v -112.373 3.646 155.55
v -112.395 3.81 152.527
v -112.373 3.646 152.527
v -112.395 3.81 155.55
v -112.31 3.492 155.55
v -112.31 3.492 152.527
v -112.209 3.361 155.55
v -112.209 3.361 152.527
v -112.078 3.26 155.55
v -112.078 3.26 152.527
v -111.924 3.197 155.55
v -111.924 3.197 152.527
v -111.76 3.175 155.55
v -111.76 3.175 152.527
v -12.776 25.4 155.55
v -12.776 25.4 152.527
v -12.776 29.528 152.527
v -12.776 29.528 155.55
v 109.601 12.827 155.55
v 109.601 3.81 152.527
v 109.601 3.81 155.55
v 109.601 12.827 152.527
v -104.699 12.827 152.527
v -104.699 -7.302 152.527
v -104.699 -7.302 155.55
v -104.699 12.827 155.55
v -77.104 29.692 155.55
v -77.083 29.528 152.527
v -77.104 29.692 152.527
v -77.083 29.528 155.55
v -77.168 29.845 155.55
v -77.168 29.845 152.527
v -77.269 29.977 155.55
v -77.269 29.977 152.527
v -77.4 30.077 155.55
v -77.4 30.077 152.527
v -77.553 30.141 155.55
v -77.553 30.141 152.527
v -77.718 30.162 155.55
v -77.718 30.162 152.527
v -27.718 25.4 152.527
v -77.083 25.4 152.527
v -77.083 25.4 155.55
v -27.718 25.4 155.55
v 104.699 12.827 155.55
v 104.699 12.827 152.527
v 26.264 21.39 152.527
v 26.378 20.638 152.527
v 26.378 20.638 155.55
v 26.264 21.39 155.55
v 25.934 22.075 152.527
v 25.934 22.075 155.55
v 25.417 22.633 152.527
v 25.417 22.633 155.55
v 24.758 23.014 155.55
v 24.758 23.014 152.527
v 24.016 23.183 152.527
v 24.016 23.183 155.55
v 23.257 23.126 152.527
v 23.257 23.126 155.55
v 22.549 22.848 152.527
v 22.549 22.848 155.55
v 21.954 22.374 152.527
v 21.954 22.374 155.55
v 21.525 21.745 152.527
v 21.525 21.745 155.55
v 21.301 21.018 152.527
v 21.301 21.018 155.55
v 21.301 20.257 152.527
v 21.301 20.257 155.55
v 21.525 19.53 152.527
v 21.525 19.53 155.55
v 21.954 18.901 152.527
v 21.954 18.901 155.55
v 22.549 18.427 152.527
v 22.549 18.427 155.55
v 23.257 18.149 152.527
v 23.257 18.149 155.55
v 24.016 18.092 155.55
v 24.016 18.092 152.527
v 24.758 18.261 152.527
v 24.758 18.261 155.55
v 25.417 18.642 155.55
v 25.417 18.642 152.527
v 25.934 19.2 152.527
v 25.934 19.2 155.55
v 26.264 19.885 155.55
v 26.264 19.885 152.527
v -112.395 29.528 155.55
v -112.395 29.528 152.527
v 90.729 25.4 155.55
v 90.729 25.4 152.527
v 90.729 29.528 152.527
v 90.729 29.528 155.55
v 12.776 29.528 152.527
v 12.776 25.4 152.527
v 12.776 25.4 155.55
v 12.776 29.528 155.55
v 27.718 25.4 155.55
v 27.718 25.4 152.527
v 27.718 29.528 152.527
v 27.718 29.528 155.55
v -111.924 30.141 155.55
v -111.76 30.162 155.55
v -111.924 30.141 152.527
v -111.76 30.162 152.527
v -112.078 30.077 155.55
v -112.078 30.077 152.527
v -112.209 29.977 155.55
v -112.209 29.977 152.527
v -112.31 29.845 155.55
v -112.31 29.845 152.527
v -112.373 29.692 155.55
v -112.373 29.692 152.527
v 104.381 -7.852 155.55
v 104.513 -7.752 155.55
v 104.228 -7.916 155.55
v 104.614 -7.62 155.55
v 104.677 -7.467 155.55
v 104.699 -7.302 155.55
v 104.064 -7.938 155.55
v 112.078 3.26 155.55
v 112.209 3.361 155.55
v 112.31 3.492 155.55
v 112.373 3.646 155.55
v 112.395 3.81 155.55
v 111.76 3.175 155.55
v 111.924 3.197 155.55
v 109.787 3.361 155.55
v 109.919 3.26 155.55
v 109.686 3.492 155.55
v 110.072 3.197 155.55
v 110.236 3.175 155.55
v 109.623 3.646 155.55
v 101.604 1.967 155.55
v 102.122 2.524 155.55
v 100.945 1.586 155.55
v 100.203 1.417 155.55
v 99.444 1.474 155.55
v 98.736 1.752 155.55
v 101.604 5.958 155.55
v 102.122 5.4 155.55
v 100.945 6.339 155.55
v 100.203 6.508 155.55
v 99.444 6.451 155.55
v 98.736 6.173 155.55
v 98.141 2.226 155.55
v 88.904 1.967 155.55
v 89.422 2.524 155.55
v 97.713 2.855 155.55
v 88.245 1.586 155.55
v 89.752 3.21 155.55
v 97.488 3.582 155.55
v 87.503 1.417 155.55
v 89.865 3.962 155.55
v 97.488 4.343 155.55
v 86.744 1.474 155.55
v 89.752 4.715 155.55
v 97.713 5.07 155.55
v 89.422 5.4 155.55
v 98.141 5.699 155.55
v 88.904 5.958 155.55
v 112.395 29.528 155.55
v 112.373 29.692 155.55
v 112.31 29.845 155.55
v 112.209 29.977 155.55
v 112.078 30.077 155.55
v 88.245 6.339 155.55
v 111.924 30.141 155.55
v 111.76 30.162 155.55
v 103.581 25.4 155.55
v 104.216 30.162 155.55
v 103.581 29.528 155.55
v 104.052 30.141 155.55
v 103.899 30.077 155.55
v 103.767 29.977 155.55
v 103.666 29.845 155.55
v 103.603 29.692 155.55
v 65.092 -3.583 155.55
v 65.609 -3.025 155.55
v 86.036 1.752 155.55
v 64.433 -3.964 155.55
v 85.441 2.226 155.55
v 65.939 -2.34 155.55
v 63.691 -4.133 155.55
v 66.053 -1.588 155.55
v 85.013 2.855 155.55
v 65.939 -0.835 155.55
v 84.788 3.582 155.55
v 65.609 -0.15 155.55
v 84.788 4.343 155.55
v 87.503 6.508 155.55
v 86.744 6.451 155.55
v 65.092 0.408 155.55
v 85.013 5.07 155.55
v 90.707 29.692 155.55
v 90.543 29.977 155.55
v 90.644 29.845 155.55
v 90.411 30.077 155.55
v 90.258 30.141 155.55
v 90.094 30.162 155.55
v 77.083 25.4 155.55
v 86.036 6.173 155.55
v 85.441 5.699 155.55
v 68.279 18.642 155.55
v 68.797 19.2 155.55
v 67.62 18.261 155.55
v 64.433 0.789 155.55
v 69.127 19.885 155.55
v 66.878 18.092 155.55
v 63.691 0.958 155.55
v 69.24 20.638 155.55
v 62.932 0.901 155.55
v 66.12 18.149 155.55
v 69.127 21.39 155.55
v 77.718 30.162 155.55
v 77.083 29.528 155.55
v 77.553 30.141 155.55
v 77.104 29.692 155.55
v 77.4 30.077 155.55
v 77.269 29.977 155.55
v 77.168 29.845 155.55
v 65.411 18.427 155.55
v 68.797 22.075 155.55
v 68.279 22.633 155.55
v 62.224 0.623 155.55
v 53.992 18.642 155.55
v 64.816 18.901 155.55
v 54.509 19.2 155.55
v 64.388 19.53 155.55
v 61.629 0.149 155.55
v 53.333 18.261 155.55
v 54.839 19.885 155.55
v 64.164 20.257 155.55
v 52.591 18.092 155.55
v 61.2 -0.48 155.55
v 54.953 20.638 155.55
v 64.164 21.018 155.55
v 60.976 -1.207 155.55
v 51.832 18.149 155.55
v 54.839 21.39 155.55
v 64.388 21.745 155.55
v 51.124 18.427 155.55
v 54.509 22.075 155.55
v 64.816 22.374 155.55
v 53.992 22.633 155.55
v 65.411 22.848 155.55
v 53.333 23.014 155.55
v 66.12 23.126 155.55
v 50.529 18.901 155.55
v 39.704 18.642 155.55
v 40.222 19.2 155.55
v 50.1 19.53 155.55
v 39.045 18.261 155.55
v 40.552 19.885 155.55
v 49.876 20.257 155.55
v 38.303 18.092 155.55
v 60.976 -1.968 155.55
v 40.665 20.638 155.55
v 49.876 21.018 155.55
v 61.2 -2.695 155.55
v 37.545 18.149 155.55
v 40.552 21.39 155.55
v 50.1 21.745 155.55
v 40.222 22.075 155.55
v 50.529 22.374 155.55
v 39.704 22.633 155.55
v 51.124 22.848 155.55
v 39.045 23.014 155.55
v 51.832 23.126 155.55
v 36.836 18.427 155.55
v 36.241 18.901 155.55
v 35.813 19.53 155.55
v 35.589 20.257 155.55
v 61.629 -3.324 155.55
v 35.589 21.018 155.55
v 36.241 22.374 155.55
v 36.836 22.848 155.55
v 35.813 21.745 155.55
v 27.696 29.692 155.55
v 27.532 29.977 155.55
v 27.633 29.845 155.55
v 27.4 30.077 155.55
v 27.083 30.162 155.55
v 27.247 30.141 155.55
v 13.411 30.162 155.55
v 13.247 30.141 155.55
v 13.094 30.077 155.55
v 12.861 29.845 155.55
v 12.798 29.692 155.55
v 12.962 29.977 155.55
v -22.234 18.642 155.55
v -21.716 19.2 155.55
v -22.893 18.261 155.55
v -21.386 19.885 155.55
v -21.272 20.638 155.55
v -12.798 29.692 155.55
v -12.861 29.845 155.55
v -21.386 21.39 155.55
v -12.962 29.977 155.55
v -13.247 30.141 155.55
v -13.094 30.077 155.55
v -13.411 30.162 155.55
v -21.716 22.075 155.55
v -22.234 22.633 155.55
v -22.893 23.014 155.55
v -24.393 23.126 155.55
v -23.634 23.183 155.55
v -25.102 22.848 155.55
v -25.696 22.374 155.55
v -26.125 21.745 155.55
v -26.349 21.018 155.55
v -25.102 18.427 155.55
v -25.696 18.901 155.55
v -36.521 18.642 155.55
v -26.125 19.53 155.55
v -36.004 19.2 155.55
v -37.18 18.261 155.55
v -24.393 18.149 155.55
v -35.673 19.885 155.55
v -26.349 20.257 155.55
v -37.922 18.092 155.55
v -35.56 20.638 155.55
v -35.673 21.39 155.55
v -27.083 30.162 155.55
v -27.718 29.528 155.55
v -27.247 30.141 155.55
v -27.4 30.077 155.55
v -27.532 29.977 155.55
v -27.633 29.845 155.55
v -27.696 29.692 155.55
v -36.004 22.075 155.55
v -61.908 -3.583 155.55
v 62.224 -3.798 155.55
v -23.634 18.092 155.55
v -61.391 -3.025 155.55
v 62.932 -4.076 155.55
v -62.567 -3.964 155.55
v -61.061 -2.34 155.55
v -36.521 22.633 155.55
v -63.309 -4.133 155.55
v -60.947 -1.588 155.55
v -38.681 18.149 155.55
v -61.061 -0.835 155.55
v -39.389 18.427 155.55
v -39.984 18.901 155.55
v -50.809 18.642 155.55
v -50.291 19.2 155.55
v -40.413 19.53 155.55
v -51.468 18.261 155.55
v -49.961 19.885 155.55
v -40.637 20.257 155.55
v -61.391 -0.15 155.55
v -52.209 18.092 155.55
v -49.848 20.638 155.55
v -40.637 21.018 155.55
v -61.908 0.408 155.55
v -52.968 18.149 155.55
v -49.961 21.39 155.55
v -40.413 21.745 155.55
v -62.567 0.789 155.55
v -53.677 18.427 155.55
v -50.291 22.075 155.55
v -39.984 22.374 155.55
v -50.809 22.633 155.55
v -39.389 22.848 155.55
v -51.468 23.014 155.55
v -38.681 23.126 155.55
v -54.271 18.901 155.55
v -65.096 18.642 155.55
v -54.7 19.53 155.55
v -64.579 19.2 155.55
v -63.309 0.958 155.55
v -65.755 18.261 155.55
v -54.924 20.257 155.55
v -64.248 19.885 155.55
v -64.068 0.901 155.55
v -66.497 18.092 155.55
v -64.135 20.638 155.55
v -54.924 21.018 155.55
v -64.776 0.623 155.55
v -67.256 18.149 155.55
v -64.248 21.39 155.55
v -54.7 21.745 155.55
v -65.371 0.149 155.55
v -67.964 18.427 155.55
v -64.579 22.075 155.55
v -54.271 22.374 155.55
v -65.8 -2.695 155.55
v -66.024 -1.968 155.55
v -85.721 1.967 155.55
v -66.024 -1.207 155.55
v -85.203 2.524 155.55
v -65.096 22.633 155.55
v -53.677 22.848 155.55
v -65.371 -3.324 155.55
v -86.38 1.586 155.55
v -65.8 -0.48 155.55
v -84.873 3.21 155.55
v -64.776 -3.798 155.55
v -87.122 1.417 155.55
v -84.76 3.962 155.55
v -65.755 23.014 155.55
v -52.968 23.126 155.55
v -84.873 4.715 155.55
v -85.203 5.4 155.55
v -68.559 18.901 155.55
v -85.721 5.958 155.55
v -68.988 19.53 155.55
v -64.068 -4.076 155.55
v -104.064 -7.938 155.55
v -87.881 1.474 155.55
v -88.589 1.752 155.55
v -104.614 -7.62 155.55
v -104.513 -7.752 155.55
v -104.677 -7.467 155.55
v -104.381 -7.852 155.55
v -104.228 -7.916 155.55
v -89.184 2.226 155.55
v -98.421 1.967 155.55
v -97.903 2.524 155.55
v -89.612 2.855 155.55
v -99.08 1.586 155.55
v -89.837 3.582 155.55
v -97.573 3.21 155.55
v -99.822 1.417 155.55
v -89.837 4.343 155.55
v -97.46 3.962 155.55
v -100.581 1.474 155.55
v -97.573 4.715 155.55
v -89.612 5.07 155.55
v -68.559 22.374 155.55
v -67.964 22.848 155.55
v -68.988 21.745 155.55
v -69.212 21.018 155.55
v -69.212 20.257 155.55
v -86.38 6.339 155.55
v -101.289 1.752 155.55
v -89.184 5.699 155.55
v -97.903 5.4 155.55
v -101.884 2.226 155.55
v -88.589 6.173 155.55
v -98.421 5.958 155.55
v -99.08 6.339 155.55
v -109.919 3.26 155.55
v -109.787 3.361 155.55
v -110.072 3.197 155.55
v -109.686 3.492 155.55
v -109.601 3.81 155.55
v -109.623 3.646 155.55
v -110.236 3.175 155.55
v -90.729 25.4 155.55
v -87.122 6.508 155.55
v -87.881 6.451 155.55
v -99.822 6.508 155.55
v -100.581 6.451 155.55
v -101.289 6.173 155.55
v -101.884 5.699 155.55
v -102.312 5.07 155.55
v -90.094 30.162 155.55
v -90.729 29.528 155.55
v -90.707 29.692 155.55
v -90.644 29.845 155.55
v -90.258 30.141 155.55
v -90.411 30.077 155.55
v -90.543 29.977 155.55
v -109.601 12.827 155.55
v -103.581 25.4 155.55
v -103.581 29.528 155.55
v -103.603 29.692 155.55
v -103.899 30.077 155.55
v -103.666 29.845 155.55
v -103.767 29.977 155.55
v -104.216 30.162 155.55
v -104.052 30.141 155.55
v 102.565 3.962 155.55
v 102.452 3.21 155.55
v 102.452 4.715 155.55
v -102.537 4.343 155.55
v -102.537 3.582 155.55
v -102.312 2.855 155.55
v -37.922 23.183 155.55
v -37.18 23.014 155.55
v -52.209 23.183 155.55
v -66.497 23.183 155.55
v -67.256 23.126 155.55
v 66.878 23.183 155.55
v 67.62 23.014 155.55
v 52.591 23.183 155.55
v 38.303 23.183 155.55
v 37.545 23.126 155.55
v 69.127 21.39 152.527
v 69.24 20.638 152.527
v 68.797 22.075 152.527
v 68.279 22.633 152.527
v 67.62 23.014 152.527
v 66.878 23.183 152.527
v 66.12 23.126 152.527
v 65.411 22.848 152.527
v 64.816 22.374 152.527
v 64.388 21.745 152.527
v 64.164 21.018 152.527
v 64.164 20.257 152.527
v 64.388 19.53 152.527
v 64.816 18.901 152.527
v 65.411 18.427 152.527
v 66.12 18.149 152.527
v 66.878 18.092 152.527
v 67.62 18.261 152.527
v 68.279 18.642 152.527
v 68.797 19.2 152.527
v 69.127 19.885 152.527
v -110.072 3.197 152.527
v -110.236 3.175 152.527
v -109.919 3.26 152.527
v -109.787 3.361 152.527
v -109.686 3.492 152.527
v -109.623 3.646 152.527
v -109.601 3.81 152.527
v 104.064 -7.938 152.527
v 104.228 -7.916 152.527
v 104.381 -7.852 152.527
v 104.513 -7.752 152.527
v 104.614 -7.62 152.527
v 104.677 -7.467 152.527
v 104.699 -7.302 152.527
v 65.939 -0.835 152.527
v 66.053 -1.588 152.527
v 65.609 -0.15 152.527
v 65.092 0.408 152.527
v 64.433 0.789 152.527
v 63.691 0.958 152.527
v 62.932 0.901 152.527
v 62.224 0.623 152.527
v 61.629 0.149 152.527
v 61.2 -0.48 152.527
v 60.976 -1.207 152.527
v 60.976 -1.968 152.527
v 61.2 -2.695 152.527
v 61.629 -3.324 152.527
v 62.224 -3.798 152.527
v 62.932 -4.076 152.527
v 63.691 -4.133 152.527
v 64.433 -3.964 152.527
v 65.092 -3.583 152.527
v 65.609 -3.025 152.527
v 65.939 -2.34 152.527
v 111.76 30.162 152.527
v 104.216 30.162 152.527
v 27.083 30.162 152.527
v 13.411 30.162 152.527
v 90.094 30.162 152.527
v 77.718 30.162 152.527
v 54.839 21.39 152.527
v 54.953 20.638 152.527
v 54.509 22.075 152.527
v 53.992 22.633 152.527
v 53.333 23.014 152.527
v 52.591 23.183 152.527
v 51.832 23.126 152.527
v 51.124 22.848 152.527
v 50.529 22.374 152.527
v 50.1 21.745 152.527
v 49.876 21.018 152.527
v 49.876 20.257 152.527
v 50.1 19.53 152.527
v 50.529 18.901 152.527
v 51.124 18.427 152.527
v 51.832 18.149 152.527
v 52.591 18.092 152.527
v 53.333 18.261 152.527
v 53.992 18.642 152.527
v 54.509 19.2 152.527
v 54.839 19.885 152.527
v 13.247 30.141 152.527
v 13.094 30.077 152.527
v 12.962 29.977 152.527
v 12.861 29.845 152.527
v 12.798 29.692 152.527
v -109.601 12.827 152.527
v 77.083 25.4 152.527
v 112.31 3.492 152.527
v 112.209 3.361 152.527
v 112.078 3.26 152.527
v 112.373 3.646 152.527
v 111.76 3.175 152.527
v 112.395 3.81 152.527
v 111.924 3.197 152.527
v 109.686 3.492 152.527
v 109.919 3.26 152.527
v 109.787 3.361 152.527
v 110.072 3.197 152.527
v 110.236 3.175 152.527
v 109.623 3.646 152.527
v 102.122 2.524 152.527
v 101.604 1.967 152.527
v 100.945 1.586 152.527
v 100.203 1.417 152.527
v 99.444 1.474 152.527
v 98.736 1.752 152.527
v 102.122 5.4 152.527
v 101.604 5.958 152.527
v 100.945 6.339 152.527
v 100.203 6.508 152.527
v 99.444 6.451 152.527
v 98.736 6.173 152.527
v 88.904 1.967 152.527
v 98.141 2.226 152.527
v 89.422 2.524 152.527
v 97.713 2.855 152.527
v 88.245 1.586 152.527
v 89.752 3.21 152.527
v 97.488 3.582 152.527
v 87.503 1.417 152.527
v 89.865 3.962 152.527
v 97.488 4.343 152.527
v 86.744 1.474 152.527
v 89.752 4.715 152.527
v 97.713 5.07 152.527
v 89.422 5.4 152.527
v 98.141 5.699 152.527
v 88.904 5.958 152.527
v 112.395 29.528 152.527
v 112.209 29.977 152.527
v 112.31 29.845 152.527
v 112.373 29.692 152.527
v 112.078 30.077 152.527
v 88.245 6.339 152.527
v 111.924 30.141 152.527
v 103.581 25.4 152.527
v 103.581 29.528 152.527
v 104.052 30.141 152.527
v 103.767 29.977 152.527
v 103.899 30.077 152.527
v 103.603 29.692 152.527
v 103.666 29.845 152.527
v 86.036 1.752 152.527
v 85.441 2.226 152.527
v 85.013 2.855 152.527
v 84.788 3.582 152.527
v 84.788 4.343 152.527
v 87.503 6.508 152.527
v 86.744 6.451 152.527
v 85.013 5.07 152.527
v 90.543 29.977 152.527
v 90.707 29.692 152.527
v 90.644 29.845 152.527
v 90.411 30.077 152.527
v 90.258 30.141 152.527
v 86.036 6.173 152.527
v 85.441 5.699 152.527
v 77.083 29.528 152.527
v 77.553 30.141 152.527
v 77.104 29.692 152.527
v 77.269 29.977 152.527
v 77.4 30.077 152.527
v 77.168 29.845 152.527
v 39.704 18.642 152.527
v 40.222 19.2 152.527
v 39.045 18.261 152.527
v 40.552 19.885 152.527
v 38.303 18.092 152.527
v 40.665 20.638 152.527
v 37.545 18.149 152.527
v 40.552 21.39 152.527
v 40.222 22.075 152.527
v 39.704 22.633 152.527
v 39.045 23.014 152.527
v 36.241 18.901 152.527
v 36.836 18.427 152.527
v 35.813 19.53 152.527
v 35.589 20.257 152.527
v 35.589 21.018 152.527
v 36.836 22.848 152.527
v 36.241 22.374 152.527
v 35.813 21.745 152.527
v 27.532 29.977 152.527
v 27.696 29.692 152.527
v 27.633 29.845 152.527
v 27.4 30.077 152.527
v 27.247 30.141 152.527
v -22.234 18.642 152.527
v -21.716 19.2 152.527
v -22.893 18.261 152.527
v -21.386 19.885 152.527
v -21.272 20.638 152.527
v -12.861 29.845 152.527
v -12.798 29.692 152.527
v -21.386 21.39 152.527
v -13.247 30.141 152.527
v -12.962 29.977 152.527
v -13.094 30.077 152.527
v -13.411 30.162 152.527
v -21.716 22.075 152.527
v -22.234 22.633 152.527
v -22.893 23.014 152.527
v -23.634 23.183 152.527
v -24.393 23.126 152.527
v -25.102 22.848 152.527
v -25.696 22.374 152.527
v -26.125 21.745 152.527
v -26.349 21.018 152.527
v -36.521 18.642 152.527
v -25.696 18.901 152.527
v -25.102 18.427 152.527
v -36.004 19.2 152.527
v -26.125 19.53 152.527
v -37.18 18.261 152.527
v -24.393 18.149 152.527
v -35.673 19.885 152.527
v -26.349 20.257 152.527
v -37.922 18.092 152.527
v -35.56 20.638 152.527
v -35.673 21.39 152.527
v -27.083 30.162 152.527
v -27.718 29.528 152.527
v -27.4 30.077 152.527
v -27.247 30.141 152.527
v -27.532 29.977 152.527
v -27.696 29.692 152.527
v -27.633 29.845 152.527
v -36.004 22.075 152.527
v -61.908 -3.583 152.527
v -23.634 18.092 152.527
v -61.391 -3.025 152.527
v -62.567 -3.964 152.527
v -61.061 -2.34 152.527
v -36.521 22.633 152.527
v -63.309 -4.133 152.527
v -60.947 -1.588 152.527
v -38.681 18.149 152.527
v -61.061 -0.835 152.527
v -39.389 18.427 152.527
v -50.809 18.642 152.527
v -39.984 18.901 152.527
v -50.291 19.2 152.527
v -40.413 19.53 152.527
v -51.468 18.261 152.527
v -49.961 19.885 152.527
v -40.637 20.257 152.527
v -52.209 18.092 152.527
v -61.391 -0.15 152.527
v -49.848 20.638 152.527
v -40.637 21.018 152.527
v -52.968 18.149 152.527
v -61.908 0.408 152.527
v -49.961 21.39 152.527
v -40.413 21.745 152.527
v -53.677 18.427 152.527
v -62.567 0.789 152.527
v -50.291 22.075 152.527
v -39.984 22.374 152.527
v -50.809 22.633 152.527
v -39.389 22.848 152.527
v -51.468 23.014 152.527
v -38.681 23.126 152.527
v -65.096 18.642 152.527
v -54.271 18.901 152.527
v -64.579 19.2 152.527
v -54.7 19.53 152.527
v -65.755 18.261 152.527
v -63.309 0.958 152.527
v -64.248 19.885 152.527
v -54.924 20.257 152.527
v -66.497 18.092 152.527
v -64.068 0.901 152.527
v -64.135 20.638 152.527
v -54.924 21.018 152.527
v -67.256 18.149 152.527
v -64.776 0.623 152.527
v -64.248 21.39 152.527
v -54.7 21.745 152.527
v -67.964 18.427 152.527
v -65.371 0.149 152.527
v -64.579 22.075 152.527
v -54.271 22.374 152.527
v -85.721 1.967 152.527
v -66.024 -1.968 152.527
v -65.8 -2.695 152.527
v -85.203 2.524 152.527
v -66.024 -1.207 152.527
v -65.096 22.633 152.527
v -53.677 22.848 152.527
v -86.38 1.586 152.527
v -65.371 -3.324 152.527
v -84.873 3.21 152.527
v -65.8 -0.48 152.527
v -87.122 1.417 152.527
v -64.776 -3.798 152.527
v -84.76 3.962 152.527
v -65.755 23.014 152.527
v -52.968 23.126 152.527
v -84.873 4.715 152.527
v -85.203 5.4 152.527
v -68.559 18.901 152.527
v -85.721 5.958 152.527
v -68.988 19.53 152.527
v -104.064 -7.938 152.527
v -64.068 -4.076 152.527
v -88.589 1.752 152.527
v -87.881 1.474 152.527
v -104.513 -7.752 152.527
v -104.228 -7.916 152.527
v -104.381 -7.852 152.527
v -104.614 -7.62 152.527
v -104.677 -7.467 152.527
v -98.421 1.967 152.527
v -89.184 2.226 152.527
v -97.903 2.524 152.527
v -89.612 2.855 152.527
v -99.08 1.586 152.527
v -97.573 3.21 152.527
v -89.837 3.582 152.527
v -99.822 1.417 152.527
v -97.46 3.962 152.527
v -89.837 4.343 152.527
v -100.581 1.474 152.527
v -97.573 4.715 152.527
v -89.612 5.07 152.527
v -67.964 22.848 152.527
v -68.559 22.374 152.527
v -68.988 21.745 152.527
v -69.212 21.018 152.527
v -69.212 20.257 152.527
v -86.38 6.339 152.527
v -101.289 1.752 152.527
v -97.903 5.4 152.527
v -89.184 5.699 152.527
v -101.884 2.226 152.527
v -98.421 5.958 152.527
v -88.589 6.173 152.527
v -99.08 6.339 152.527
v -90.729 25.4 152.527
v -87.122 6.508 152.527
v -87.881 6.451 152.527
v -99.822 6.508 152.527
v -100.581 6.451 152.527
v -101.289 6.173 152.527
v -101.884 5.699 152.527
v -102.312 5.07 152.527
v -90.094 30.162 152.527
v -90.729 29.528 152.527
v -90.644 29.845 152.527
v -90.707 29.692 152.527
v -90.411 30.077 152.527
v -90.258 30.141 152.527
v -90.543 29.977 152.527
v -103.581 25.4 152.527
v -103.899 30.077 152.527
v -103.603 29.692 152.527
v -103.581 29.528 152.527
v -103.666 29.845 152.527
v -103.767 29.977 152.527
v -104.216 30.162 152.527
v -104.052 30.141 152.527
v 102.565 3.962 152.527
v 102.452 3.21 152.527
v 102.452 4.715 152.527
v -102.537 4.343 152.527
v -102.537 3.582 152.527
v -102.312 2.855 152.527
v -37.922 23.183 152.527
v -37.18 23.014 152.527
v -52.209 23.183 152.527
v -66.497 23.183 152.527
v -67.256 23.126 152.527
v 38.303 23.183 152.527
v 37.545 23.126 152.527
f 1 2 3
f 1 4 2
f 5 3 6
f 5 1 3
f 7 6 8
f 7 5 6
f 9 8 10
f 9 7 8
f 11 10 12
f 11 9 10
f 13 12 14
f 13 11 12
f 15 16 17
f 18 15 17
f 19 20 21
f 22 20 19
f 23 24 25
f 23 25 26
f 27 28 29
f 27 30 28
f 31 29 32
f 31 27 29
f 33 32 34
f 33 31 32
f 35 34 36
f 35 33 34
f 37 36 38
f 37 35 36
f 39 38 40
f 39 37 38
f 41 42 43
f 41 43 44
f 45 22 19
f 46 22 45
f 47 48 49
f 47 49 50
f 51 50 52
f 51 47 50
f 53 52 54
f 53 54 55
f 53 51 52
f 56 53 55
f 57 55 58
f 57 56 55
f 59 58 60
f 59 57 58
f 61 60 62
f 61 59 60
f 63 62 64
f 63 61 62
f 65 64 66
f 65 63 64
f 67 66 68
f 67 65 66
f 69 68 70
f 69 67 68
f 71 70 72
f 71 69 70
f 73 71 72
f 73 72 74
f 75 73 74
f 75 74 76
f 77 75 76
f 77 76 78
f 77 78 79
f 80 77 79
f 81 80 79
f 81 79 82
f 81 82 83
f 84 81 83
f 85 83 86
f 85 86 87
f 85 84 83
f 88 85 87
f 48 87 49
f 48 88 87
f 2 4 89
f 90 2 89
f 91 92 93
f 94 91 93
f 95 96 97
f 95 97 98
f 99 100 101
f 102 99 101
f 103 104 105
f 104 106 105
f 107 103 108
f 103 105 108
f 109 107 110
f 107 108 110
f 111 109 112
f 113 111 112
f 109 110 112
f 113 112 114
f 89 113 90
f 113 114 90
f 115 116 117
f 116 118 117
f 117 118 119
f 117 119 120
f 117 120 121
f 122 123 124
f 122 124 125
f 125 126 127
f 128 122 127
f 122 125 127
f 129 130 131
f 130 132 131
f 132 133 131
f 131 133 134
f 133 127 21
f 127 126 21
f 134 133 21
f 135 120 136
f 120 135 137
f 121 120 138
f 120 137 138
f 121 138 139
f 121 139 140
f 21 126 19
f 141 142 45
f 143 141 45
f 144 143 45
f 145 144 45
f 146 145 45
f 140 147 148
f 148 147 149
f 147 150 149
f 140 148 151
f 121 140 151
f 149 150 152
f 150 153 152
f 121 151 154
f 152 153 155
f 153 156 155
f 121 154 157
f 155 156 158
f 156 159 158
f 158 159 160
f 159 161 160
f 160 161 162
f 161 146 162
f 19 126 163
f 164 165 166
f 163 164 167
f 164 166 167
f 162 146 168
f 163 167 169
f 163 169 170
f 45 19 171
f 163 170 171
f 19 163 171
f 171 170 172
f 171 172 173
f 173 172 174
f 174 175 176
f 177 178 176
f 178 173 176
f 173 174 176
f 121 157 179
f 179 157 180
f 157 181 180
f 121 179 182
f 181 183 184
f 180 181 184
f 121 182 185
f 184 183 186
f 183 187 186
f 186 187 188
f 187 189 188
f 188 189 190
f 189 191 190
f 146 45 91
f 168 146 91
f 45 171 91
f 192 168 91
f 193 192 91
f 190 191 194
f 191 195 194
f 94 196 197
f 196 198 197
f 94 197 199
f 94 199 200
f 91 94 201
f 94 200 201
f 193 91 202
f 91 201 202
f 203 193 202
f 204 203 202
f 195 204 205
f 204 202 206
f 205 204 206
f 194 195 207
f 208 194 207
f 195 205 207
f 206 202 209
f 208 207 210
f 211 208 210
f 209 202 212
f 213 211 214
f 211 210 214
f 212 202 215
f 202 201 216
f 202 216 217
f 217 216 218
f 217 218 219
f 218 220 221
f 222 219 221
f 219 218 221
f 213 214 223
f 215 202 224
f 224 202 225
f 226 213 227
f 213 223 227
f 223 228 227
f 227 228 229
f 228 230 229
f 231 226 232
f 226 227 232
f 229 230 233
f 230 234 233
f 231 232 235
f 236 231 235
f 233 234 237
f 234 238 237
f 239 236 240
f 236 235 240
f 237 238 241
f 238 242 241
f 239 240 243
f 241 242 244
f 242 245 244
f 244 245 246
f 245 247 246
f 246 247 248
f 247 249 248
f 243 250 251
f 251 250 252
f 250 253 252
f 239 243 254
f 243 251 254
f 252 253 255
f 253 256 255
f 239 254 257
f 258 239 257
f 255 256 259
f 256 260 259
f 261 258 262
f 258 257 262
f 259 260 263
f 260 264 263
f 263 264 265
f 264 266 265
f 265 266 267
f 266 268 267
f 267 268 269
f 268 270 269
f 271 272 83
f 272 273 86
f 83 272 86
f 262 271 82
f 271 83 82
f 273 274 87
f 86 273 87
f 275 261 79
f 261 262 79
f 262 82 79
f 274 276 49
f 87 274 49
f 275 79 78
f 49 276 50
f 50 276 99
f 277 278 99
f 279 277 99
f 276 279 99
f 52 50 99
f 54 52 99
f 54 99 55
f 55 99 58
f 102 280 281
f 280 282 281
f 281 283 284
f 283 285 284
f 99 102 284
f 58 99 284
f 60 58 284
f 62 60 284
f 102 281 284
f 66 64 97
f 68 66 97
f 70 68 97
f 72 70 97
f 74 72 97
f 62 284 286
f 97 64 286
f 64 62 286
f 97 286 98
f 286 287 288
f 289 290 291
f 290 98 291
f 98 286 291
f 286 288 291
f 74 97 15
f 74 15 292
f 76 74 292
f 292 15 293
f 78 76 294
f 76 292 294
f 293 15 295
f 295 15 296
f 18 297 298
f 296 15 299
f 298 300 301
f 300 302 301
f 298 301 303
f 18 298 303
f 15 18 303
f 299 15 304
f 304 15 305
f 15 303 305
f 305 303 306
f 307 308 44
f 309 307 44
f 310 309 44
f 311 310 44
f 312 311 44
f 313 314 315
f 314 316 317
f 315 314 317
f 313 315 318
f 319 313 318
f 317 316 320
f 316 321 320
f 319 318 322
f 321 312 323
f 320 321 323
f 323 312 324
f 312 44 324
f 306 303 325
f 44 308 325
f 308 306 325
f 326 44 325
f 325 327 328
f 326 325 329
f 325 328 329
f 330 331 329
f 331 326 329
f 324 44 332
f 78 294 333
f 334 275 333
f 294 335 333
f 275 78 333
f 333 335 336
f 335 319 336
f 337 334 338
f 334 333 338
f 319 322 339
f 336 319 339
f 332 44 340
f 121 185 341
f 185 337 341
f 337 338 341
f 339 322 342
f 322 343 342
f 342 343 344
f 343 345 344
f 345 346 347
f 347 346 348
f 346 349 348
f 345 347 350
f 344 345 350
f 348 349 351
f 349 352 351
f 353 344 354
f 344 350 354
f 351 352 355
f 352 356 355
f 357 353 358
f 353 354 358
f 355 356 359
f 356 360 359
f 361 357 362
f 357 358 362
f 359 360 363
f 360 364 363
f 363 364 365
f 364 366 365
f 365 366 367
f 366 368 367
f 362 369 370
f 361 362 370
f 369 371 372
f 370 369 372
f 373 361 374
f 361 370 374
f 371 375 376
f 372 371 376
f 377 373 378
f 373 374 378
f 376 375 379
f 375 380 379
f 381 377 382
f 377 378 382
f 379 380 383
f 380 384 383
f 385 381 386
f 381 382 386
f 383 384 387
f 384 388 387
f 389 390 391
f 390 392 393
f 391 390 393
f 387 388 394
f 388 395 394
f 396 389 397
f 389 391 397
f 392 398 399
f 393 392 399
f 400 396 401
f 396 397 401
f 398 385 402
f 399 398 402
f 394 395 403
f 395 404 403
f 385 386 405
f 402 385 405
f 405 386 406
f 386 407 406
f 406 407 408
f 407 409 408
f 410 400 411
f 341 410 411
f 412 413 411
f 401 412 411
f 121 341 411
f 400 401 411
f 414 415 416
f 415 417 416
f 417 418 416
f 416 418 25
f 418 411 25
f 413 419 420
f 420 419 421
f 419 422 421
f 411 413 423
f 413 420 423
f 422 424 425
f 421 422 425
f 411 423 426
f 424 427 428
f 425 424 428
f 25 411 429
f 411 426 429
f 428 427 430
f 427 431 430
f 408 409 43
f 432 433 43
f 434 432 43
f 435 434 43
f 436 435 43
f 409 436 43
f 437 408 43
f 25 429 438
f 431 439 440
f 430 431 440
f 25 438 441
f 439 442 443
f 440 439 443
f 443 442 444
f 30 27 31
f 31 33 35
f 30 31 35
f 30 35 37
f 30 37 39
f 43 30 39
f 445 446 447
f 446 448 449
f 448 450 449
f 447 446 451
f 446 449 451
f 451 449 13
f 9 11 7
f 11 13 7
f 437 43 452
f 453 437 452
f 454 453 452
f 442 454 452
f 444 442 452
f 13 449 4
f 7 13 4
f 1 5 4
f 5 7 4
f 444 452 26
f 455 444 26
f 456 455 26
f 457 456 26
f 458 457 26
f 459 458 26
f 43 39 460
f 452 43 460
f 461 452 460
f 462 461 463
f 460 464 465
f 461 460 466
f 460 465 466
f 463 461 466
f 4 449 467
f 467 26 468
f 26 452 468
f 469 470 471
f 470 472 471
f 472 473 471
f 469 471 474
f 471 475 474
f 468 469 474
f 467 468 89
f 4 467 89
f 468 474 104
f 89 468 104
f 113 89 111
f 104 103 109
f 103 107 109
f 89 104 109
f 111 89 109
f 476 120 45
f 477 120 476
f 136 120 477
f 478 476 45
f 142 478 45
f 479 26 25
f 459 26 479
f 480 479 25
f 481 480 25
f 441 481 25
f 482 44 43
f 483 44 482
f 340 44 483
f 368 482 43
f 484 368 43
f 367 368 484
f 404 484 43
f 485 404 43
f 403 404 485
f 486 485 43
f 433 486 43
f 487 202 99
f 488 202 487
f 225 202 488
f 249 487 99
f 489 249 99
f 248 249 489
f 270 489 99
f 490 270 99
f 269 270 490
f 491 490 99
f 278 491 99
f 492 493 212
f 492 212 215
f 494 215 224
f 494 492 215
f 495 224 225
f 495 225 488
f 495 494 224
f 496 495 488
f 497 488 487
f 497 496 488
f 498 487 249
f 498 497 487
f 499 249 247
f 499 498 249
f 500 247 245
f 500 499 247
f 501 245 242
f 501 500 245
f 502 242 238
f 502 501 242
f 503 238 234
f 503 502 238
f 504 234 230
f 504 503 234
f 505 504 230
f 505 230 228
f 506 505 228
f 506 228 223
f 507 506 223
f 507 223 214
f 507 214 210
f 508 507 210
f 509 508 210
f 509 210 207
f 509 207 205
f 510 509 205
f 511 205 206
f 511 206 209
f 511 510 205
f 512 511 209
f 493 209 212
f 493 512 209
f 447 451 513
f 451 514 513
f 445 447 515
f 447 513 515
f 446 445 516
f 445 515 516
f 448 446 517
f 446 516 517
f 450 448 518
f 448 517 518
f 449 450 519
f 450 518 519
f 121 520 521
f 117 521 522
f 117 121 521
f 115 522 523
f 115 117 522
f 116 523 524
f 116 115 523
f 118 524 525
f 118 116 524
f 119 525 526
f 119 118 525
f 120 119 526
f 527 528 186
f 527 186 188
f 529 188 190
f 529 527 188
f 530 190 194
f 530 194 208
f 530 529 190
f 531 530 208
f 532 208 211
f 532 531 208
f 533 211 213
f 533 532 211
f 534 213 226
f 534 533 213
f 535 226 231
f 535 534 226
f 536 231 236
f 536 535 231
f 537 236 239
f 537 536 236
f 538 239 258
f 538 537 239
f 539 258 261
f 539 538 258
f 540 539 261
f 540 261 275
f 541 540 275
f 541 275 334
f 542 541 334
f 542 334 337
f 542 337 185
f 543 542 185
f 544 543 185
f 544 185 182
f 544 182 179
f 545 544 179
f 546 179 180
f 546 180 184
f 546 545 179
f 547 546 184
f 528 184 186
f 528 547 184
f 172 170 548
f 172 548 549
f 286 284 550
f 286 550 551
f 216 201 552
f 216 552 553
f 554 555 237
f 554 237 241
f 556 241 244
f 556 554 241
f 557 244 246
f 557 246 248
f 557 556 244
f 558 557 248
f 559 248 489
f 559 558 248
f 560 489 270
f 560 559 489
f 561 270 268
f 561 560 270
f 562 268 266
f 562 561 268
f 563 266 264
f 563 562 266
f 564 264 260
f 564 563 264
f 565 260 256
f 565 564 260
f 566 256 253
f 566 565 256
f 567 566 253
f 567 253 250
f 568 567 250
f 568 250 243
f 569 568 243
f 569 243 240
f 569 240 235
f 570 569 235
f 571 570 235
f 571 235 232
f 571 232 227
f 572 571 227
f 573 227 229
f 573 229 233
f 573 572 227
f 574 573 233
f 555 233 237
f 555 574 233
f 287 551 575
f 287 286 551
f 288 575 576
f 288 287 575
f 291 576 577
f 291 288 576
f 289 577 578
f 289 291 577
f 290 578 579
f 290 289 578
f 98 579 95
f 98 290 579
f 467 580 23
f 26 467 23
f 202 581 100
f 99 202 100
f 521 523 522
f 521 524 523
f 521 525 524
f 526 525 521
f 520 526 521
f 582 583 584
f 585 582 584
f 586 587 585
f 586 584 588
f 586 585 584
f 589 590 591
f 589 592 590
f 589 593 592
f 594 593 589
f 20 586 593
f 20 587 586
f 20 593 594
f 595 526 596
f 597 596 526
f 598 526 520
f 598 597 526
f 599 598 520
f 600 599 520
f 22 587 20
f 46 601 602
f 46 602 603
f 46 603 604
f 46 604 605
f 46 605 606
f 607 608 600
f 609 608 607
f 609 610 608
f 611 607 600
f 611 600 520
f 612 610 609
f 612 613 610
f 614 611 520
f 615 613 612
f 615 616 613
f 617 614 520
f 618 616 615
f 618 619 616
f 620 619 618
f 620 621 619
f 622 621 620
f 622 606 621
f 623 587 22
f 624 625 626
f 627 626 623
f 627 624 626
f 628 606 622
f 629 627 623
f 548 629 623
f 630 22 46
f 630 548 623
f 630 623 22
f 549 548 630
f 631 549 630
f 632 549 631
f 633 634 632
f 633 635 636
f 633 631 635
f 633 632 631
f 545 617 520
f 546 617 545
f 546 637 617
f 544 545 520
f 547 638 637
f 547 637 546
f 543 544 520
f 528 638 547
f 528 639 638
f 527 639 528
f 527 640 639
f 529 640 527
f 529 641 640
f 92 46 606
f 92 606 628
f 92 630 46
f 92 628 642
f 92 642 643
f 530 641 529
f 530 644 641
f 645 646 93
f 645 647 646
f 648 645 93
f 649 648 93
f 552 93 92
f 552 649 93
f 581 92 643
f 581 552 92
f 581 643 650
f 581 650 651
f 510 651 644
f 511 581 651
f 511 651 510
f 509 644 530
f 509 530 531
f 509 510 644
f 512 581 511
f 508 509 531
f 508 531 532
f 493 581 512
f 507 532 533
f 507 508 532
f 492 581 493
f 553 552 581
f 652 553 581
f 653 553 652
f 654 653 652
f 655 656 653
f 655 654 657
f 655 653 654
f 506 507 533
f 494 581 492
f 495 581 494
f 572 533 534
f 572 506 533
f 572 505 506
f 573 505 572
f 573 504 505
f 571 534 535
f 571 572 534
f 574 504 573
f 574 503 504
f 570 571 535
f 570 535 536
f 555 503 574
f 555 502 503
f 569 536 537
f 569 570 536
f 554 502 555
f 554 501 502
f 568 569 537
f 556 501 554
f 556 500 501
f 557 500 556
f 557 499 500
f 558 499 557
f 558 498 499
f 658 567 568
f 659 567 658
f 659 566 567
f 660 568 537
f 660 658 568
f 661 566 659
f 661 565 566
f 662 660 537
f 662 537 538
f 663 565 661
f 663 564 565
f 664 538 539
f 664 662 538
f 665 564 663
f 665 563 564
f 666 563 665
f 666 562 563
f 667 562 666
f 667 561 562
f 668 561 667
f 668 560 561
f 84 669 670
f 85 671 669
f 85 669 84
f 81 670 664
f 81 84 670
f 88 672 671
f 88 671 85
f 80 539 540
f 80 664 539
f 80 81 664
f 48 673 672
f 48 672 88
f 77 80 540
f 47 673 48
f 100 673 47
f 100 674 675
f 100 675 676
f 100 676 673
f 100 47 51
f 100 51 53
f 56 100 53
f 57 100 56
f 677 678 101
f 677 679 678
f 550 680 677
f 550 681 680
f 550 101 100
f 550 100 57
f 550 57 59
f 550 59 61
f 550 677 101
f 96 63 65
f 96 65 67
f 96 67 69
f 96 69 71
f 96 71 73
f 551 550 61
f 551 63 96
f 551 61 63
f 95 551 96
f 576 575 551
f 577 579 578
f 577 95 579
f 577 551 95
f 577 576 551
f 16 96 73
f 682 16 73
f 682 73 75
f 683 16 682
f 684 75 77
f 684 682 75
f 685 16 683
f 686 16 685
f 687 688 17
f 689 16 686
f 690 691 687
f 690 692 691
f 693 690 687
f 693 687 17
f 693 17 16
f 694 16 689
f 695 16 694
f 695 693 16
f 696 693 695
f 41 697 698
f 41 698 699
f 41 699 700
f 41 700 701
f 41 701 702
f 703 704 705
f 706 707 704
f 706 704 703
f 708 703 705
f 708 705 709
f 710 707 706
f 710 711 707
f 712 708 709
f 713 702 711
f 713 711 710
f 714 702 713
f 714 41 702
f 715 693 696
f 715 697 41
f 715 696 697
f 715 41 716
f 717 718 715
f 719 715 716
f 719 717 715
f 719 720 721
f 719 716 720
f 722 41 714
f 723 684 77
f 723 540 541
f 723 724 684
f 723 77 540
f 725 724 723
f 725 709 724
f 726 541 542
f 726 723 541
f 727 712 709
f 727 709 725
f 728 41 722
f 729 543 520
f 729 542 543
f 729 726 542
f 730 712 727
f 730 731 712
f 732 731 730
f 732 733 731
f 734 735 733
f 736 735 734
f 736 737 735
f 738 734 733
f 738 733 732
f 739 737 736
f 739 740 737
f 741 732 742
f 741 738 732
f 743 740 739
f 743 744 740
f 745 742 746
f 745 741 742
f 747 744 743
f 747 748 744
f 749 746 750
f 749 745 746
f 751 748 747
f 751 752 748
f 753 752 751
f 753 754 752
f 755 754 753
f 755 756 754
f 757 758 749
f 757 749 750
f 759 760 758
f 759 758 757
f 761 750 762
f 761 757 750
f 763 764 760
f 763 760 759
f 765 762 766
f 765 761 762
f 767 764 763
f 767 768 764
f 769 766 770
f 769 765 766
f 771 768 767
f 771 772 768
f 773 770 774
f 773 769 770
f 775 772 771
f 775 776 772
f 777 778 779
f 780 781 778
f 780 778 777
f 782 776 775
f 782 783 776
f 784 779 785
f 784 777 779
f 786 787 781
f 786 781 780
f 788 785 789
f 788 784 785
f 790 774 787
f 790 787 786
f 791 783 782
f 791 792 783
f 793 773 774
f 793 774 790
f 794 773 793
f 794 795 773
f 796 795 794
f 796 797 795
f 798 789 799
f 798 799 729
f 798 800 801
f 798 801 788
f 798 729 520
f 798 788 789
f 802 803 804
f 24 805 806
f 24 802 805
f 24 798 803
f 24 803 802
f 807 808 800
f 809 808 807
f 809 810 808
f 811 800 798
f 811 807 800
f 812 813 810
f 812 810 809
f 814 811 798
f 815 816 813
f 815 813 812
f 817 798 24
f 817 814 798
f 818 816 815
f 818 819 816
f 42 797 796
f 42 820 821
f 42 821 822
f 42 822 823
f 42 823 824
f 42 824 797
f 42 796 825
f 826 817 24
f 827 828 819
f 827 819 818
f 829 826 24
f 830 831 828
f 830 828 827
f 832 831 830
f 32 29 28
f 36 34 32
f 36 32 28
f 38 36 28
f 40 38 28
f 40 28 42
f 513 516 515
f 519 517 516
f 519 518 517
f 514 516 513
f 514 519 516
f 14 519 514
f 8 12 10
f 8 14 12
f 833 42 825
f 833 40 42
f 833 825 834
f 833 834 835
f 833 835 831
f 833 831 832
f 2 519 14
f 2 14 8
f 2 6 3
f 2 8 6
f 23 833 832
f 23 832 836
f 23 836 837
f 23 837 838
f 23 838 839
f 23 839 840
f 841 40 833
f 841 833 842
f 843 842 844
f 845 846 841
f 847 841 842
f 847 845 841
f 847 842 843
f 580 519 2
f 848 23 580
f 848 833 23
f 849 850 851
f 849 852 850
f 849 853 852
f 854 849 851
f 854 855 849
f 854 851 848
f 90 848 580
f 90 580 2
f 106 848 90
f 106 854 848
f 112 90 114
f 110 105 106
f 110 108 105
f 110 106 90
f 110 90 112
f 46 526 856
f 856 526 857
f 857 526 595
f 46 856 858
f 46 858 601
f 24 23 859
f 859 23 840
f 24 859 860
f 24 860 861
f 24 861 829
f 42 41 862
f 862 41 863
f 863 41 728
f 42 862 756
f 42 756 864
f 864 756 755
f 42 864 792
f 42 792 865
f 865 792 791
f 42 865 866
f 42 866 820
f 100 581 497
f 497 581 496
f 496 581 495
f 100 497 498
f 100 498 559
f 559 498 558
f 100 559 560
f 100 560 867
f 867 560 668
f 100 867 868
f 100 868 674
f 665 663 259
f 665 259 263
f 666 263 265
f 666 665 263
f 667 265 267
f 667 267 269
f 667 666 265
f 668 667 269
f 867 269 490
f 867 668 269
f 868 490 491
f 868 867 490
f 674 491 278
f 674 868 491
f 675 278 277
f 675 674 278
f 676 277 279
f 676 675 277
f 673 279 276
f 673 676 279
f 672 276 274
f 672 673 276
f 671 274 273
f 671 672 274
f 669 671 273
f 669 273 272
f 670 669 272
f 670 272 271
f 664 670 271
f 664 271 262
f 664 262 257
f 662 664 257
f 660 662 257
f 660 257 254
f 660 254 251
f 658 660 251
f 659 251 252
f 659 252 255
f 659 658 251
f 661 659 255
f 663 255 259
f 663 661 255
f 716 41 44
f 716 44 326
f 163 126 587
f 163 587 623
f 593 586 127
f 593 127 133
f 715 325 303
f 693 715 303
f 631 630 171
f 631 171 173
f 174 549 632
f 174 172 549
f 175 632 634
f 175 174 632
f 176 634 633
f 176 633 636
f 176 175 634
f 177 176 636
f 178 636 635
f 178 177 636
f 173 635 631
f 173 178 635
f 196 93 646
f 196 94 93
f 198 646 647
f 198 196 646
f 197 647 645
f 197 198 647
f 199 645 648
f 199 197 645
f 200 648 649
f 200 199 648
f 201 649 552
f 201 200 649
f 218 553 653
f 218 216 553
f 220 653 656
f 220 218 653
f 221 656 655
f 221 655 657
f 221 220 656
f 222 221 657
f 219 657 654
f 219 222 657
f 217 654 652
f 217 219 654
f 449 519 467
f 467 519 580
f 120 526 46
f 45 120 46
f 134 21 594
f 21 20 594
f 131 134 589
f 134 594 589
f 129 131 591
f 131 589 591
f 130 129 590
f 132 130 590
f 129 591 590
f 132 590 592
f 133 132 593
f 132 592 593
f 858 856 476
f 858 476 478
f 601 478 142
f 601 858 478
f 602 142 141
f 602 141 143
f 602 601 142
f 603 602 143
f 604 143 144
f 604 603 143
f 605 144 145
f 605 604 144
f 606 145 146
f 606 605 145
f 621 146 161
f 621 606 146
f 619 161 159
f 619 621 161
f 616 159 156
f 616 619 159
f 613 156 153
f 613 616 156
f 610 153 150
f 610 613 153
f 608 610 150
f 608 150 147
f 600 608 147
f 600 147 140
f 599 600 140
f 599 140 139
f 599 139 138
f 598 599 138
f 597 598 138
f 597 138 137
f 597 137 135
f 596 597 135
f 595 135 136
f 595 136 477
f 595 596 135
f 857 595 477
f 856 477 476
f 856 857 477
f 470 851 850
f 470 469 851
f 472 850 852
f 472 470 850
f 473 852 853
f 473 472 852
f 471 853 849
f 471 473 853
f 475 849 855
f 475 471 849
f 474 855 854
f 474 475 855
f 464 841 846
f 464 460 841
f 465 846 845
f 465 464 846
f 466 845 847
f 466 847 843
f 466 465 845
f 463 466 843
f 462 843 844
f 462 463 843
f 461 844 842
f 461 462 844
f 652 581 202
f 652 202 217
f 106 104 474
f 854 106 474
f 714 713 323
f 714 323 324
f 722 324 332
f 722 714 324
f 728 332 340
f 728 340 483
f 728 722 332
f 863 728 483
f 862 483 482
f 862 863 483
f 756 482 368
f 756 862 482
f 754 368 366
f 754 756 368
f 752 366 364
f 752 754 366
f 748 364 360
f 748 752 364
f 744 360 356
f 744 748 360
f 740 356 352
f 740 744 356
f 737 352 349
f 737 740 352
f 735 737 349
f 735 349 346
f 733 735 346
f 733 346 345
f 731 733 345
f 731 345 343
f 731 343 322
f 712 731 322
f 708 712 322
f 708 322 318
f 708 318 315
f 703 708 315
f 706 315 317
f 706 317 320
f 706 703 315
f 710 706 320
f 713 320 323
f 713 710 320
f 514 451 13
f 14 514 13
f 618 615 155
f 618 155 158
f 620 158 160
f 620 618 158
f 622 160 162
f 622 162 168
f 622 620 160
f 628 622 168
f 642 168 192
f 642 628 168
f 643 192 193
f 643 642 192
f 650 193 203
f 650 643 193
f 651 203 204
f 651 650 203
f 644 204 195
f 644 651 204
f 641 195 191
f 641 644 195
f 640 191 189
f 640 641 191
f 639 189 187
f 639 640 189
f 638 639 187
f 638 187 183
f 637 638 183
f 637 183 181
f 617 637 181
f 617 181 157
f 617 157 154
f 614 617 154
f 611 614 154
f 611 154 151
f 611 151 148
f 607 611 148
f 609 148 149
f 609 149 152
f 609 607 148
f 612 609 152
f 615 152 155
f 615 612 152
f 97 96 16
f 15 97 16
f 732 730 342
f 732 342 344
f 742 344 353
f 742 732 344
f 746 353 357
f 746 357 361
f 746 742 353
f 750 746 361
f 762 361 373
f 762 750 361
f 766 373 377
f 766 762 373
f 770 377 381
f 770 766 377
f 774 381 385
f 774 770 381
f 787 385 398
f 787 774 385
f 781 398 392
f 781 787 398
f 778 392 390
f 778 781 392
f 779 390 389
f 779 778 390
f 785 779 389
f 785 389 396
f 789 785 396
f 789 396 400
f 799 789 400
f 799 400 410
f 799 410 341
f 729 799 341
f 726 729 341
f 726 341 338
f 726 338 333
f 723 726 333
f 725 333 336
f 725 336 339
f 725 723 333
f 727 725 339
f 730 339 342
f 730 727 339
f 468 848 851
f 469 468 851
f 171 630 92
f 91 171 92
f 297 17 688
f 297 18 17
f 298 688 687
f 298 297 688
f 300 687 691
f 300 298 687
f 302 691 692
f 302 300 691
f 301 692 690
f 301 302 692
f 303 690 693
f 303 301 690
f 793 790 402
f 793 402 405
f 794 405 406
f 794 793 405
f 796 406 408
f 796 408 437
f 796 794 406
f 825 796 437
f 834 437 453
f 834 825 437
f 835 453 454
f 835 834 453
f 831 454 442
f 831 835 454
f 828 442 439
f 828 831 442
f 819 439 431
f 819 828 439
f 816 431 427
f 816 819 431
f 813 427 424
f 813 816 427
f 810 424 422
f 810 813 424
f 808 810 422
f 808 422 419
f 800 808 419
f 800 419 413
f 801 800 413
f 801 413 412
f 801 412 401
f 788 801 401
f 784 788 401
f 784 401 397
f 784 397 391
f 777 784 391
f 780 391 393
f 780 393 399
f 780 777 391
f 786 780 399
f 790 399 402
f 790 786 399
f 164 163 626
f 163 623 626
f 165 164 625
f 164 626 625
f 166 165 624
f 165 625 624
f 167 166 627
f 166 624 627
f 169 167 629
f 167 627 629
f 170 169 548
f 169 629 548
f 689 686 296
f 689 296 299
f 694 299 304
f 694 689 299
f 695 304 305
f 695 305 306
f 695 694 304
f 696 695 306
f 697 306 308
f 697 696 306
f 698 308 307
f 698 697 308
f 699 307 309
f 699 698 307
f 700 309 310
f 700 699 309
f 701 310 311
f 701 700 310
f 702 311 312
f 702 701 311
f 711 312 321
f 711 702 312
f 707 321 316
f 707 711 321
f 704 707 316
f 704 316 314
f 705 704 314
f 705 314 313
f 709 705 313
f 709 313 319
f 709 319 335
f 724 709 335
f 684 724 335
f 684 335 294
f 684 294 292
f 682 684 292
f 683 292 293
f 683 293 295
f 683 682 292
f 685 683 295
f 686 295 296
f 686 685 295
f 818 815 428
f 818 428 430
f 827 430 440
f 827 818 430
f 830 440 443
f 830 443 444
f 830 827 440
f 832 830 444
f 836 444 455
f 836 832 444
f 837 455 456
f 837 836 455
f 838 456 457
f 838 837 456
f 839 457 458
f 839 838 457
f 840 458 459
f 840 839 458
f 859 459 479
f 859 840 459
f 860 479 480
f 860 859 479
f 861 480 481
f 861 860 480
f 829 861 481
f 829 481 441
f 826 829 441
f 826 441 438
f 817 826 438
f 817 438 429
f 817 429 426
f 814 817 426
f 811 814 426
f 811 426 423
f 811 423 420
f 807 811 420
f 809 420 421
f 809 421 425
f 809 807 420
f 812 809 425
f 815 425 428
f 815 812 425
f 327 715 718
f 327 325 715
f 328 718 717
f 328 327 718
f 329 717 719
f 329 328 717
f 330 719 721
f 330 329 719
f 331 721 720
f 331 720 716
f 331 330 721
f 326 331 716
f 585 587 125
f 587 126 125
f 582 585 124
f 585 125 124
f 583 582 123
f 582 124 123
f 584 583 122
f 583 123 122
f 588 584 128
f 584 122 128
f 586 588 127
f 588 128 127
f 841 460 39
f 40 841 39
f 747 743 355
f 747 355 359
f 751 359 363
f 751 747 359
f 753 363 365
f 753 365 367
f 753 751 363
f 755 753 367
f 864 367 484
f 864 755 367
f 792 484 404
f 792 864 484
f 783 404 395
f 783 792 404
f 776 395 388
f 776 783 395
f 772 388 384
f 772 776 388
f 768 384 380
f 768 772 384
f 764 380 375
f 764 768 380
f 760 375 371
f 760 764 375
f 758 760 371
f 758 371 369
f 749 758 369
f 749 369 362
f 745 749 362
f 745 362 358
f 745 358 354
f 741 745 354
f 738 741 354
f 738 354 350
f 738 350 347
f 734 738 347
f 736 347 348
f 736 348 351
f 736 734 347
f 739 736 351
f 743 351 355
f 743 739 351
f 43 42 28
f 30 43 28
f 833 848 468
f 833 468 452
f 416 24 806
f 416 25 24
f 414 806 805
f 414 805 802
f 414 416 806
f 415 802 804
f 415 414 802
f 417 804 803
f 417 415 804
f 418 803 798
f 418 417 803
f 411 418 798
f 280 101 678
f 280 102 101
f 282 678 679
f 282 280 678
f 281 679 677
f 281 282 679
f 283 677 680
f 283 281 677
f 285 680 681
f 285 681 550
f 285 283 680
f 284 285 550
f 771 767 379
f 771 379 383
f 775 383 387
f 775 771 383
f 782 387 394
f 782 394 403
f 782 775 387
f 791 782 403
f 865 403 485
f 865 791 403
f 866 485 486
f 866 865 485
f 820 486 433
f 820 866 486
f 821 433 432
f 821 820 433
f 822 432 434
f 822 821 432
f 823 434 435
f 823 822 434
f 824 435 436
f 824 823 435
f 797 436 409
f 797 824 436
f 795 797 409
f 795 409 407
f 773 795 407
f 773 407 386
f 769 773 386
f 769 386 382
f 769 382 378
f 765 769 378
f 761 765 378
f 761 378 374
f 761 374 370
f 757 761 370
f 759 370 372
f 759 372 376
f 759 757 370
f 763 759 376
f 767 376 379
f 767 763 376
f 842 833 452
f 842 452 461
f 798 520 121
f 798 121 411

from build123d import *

# Parameters (mm, degrees)
SKETCH41_R                  = 2.5527
BACK_PLATE_EXTRUDE_DEPTH    = 3.0226
SKETCH71_W                  = 8.89
SKETCH71_H                  = 4.7625
SKETCH71_W_2                = 13.79855
SKETCH71_W_3                = 15.09395
BOSS_EXTRUDE26_DEPTH        = 3.0226
SKETCH91_W                  = 4.9022
SKETCH91_H                  = 20.7645
SKETCH91_W_2                = 12.8524
SKETCH91_H_2                = 4.7625
SKETCH91_W_3                = 49.3649
SKETCH91_W_4                = 12.7762
BACK_PLATE_TOLERENCES_DEPTH = 4.0226
FILLET27_R                  = 0.635
FILLET28_R                  = 0.635


with BuildPart() as part:
    # Sketch41 → Back Plate Extrude (new body)
    with BuildSketch(Plane.XY.offset(152.527)):
        Polygon((-104.775, -7.9375), (-104.775, 12.7), (-109.5248, 12.7), (-109.5248, 3.175), (-112.395, 3.175), (-112.395, 25.4), (-104.775, 25.4), (104.775, 25.4), (112.395, 25.4), (112.395, 3.175), (109.5248, 3.175), (109.5248, 12.7), (104.775, 12.7), (104.775, -7.9375), align=None)
        with Locations((-100.0125, 3.9624)):
            Circle(SKETCH41_R, mode=Mode.SUBTRACT)
        with Locations((100.0125, 3.9624)):
            Circle(SKETCH41_R, mode=Mode.SUBTRACT)
        with Locations((23.8252, 20.6375)):
            Circle(SKETCH41_R, mode=Mode.SUBTRACT)
        with Locations((38.1127, 20.6375)):
            Circle(SKETCH41_R, mode=Mode.SUBTRACT)
        with Locations((52.4002, 20.6375)):
            Circle(SKETCH41_R, mode=Mode.SUBTRACT)
        with Locations((66.6877, 20.6375)):
            Circle(SKETCH41_R, mode=Mode.SUBTRACT)
        with Locations((-66.6877, 20.6375)):
            Circle(SKETCH41_R, mode=Mode.SUBTRACT)
        with Locations((-52.4002, 20.6375)):
            Circle(SKETCH41_R, mode=Mode.SUBTRACT)
        with Locations((-38.1127, 20.6375)):
            Circle(SKETCH41_R, mode=Mode.SUBTRACT)
        with Locations((-23.8252, 20.6375)):
            Circle(SKETCH41_R, mode=Mode.SUBTRACT)
        with Locations((-87.3125, 3.9624)):
            Circle(SKETCH41_R, mode=Mode.SUBTRACT)
        with Locations((87.3125, 3.9624)):
            Circle(SKETCH41_R, mode=Mode.SUBTRACT)
        with Locations((-63.5, -1.5875)):
            Circle(SKETCH41_R, mode=Mode.SUBTRACT)
        with Locations((63.5, -1.5875)):
            Circle(SKETCH41_R, mode=Mode.SUBTRACT)
    extrude(amount=BACK_PLATE_EXTRUDE_DEPTH)

    # Sketch71 → Boss-Extrude26 (add, through all)
    with BuildSketch(Plane.XY.offset(155.5496)):
        with Locations((-107.95, 27.78125)):
            Rectangle(SKETCH71_W, SKETCH71_H)
        with Locations((-83.905725, 27.78125)):
            Rectangle(SKETCH71_W_2, SKETCH71_H)
        with Locations((-20.246975, 27.78125)):
            Rectangle(SKETCH71_W_3, SKETCH71_H)
    boss_extrude26 = extrude(amount=-BOSS_EXTRUDE26_DEPTH)

    # Mirror23: Boss-Extrude26 across plane
    add(boss_extrude26.mirror(Plane(origin=(0, 0, 0), x_dir=(0, 0, 1), z_dir=(1, 0, 0))))

    # Sketch91 → Back Plate Tolerences (cut, through all)
    with BuildSketch(Plane(origin=(0, 0, 152.527), x_dir=(-1, 0, 0), z_dir=(0, 0, -1))):
        with Locations((-107.1499, 2.44475)):
            Rectangle(SKETCH91_W, SKETCH91_H)
        with Locations((-97.155, 27.78125)):
            Rectangle(SKETCH91_W_2, SKETCH91_H_2)
        with Locations((-52.4002, 27.78125)):
            Rectangle(SKETCH91_W_3, SKETCH91_H_2)
        with Locations((-6.3881, 27.78125)):
            Rectangle(SKETCH91_W_4, SKETCH91_H_2)
    back_plate_tolerences = extrude(amount=-BACK_PLATE_TOLERENCES_DEPTH, mode=Mode.SUBTRACT)

    # Mirror25: Back Plate Tolerences across plane
    add(back_plate_tolerences.mirror(Plane(origin=(0, 0, 0), x_dir=(0, 0, 1), z_dir=(1, 0, 0))), mode=Mode.SUBTRACT)

    # Fillet27
    fillet27_edges = [part.edges().sort_by_distance(p)[0] for p in [
        (-112.395, 30.1625, 154.0383),
        (112.395, 30.1625, 154.0383),
        (109.601, 3.175, 154.0383),
        (104.6988, -7.9375, 154.0383),
        (-112.395, 3.175, 154.0383),
        (112.395, 3.175, 154.0383),
        (-109.601, 3.175, 154.0383),
        (-104.6988, -7.9375, 154.0383),
    ]]
    fillet(fillet27_edges, radius=FILLET27_R)

    # Fillet28
    fillet28_edges = [part.edges().sort_by_distance(p)[0] for p in [
        (103.5812, 30.1625, 154.0383),
        (90.7288, 30.1625, 154.0383),
        (77.08265, 30.1625, 154.0383),
        (27.71775, 30.1625, 154.0383),
        (12.7762, 30.1625, 154.0383),
        (-103.5812, 30.1625, 154.0383),
        (-90.7288, 30.1625, 154.0383),
        (-27.71775, 30.1625, 154.0383),
        (-77.08265, 30.1625, 154.0383),
        (-12.7762, 30.1625, 154.0383),
    ]]
    fillet(fillet28_edges, radius=FILLET28_R)


solid = part.part
